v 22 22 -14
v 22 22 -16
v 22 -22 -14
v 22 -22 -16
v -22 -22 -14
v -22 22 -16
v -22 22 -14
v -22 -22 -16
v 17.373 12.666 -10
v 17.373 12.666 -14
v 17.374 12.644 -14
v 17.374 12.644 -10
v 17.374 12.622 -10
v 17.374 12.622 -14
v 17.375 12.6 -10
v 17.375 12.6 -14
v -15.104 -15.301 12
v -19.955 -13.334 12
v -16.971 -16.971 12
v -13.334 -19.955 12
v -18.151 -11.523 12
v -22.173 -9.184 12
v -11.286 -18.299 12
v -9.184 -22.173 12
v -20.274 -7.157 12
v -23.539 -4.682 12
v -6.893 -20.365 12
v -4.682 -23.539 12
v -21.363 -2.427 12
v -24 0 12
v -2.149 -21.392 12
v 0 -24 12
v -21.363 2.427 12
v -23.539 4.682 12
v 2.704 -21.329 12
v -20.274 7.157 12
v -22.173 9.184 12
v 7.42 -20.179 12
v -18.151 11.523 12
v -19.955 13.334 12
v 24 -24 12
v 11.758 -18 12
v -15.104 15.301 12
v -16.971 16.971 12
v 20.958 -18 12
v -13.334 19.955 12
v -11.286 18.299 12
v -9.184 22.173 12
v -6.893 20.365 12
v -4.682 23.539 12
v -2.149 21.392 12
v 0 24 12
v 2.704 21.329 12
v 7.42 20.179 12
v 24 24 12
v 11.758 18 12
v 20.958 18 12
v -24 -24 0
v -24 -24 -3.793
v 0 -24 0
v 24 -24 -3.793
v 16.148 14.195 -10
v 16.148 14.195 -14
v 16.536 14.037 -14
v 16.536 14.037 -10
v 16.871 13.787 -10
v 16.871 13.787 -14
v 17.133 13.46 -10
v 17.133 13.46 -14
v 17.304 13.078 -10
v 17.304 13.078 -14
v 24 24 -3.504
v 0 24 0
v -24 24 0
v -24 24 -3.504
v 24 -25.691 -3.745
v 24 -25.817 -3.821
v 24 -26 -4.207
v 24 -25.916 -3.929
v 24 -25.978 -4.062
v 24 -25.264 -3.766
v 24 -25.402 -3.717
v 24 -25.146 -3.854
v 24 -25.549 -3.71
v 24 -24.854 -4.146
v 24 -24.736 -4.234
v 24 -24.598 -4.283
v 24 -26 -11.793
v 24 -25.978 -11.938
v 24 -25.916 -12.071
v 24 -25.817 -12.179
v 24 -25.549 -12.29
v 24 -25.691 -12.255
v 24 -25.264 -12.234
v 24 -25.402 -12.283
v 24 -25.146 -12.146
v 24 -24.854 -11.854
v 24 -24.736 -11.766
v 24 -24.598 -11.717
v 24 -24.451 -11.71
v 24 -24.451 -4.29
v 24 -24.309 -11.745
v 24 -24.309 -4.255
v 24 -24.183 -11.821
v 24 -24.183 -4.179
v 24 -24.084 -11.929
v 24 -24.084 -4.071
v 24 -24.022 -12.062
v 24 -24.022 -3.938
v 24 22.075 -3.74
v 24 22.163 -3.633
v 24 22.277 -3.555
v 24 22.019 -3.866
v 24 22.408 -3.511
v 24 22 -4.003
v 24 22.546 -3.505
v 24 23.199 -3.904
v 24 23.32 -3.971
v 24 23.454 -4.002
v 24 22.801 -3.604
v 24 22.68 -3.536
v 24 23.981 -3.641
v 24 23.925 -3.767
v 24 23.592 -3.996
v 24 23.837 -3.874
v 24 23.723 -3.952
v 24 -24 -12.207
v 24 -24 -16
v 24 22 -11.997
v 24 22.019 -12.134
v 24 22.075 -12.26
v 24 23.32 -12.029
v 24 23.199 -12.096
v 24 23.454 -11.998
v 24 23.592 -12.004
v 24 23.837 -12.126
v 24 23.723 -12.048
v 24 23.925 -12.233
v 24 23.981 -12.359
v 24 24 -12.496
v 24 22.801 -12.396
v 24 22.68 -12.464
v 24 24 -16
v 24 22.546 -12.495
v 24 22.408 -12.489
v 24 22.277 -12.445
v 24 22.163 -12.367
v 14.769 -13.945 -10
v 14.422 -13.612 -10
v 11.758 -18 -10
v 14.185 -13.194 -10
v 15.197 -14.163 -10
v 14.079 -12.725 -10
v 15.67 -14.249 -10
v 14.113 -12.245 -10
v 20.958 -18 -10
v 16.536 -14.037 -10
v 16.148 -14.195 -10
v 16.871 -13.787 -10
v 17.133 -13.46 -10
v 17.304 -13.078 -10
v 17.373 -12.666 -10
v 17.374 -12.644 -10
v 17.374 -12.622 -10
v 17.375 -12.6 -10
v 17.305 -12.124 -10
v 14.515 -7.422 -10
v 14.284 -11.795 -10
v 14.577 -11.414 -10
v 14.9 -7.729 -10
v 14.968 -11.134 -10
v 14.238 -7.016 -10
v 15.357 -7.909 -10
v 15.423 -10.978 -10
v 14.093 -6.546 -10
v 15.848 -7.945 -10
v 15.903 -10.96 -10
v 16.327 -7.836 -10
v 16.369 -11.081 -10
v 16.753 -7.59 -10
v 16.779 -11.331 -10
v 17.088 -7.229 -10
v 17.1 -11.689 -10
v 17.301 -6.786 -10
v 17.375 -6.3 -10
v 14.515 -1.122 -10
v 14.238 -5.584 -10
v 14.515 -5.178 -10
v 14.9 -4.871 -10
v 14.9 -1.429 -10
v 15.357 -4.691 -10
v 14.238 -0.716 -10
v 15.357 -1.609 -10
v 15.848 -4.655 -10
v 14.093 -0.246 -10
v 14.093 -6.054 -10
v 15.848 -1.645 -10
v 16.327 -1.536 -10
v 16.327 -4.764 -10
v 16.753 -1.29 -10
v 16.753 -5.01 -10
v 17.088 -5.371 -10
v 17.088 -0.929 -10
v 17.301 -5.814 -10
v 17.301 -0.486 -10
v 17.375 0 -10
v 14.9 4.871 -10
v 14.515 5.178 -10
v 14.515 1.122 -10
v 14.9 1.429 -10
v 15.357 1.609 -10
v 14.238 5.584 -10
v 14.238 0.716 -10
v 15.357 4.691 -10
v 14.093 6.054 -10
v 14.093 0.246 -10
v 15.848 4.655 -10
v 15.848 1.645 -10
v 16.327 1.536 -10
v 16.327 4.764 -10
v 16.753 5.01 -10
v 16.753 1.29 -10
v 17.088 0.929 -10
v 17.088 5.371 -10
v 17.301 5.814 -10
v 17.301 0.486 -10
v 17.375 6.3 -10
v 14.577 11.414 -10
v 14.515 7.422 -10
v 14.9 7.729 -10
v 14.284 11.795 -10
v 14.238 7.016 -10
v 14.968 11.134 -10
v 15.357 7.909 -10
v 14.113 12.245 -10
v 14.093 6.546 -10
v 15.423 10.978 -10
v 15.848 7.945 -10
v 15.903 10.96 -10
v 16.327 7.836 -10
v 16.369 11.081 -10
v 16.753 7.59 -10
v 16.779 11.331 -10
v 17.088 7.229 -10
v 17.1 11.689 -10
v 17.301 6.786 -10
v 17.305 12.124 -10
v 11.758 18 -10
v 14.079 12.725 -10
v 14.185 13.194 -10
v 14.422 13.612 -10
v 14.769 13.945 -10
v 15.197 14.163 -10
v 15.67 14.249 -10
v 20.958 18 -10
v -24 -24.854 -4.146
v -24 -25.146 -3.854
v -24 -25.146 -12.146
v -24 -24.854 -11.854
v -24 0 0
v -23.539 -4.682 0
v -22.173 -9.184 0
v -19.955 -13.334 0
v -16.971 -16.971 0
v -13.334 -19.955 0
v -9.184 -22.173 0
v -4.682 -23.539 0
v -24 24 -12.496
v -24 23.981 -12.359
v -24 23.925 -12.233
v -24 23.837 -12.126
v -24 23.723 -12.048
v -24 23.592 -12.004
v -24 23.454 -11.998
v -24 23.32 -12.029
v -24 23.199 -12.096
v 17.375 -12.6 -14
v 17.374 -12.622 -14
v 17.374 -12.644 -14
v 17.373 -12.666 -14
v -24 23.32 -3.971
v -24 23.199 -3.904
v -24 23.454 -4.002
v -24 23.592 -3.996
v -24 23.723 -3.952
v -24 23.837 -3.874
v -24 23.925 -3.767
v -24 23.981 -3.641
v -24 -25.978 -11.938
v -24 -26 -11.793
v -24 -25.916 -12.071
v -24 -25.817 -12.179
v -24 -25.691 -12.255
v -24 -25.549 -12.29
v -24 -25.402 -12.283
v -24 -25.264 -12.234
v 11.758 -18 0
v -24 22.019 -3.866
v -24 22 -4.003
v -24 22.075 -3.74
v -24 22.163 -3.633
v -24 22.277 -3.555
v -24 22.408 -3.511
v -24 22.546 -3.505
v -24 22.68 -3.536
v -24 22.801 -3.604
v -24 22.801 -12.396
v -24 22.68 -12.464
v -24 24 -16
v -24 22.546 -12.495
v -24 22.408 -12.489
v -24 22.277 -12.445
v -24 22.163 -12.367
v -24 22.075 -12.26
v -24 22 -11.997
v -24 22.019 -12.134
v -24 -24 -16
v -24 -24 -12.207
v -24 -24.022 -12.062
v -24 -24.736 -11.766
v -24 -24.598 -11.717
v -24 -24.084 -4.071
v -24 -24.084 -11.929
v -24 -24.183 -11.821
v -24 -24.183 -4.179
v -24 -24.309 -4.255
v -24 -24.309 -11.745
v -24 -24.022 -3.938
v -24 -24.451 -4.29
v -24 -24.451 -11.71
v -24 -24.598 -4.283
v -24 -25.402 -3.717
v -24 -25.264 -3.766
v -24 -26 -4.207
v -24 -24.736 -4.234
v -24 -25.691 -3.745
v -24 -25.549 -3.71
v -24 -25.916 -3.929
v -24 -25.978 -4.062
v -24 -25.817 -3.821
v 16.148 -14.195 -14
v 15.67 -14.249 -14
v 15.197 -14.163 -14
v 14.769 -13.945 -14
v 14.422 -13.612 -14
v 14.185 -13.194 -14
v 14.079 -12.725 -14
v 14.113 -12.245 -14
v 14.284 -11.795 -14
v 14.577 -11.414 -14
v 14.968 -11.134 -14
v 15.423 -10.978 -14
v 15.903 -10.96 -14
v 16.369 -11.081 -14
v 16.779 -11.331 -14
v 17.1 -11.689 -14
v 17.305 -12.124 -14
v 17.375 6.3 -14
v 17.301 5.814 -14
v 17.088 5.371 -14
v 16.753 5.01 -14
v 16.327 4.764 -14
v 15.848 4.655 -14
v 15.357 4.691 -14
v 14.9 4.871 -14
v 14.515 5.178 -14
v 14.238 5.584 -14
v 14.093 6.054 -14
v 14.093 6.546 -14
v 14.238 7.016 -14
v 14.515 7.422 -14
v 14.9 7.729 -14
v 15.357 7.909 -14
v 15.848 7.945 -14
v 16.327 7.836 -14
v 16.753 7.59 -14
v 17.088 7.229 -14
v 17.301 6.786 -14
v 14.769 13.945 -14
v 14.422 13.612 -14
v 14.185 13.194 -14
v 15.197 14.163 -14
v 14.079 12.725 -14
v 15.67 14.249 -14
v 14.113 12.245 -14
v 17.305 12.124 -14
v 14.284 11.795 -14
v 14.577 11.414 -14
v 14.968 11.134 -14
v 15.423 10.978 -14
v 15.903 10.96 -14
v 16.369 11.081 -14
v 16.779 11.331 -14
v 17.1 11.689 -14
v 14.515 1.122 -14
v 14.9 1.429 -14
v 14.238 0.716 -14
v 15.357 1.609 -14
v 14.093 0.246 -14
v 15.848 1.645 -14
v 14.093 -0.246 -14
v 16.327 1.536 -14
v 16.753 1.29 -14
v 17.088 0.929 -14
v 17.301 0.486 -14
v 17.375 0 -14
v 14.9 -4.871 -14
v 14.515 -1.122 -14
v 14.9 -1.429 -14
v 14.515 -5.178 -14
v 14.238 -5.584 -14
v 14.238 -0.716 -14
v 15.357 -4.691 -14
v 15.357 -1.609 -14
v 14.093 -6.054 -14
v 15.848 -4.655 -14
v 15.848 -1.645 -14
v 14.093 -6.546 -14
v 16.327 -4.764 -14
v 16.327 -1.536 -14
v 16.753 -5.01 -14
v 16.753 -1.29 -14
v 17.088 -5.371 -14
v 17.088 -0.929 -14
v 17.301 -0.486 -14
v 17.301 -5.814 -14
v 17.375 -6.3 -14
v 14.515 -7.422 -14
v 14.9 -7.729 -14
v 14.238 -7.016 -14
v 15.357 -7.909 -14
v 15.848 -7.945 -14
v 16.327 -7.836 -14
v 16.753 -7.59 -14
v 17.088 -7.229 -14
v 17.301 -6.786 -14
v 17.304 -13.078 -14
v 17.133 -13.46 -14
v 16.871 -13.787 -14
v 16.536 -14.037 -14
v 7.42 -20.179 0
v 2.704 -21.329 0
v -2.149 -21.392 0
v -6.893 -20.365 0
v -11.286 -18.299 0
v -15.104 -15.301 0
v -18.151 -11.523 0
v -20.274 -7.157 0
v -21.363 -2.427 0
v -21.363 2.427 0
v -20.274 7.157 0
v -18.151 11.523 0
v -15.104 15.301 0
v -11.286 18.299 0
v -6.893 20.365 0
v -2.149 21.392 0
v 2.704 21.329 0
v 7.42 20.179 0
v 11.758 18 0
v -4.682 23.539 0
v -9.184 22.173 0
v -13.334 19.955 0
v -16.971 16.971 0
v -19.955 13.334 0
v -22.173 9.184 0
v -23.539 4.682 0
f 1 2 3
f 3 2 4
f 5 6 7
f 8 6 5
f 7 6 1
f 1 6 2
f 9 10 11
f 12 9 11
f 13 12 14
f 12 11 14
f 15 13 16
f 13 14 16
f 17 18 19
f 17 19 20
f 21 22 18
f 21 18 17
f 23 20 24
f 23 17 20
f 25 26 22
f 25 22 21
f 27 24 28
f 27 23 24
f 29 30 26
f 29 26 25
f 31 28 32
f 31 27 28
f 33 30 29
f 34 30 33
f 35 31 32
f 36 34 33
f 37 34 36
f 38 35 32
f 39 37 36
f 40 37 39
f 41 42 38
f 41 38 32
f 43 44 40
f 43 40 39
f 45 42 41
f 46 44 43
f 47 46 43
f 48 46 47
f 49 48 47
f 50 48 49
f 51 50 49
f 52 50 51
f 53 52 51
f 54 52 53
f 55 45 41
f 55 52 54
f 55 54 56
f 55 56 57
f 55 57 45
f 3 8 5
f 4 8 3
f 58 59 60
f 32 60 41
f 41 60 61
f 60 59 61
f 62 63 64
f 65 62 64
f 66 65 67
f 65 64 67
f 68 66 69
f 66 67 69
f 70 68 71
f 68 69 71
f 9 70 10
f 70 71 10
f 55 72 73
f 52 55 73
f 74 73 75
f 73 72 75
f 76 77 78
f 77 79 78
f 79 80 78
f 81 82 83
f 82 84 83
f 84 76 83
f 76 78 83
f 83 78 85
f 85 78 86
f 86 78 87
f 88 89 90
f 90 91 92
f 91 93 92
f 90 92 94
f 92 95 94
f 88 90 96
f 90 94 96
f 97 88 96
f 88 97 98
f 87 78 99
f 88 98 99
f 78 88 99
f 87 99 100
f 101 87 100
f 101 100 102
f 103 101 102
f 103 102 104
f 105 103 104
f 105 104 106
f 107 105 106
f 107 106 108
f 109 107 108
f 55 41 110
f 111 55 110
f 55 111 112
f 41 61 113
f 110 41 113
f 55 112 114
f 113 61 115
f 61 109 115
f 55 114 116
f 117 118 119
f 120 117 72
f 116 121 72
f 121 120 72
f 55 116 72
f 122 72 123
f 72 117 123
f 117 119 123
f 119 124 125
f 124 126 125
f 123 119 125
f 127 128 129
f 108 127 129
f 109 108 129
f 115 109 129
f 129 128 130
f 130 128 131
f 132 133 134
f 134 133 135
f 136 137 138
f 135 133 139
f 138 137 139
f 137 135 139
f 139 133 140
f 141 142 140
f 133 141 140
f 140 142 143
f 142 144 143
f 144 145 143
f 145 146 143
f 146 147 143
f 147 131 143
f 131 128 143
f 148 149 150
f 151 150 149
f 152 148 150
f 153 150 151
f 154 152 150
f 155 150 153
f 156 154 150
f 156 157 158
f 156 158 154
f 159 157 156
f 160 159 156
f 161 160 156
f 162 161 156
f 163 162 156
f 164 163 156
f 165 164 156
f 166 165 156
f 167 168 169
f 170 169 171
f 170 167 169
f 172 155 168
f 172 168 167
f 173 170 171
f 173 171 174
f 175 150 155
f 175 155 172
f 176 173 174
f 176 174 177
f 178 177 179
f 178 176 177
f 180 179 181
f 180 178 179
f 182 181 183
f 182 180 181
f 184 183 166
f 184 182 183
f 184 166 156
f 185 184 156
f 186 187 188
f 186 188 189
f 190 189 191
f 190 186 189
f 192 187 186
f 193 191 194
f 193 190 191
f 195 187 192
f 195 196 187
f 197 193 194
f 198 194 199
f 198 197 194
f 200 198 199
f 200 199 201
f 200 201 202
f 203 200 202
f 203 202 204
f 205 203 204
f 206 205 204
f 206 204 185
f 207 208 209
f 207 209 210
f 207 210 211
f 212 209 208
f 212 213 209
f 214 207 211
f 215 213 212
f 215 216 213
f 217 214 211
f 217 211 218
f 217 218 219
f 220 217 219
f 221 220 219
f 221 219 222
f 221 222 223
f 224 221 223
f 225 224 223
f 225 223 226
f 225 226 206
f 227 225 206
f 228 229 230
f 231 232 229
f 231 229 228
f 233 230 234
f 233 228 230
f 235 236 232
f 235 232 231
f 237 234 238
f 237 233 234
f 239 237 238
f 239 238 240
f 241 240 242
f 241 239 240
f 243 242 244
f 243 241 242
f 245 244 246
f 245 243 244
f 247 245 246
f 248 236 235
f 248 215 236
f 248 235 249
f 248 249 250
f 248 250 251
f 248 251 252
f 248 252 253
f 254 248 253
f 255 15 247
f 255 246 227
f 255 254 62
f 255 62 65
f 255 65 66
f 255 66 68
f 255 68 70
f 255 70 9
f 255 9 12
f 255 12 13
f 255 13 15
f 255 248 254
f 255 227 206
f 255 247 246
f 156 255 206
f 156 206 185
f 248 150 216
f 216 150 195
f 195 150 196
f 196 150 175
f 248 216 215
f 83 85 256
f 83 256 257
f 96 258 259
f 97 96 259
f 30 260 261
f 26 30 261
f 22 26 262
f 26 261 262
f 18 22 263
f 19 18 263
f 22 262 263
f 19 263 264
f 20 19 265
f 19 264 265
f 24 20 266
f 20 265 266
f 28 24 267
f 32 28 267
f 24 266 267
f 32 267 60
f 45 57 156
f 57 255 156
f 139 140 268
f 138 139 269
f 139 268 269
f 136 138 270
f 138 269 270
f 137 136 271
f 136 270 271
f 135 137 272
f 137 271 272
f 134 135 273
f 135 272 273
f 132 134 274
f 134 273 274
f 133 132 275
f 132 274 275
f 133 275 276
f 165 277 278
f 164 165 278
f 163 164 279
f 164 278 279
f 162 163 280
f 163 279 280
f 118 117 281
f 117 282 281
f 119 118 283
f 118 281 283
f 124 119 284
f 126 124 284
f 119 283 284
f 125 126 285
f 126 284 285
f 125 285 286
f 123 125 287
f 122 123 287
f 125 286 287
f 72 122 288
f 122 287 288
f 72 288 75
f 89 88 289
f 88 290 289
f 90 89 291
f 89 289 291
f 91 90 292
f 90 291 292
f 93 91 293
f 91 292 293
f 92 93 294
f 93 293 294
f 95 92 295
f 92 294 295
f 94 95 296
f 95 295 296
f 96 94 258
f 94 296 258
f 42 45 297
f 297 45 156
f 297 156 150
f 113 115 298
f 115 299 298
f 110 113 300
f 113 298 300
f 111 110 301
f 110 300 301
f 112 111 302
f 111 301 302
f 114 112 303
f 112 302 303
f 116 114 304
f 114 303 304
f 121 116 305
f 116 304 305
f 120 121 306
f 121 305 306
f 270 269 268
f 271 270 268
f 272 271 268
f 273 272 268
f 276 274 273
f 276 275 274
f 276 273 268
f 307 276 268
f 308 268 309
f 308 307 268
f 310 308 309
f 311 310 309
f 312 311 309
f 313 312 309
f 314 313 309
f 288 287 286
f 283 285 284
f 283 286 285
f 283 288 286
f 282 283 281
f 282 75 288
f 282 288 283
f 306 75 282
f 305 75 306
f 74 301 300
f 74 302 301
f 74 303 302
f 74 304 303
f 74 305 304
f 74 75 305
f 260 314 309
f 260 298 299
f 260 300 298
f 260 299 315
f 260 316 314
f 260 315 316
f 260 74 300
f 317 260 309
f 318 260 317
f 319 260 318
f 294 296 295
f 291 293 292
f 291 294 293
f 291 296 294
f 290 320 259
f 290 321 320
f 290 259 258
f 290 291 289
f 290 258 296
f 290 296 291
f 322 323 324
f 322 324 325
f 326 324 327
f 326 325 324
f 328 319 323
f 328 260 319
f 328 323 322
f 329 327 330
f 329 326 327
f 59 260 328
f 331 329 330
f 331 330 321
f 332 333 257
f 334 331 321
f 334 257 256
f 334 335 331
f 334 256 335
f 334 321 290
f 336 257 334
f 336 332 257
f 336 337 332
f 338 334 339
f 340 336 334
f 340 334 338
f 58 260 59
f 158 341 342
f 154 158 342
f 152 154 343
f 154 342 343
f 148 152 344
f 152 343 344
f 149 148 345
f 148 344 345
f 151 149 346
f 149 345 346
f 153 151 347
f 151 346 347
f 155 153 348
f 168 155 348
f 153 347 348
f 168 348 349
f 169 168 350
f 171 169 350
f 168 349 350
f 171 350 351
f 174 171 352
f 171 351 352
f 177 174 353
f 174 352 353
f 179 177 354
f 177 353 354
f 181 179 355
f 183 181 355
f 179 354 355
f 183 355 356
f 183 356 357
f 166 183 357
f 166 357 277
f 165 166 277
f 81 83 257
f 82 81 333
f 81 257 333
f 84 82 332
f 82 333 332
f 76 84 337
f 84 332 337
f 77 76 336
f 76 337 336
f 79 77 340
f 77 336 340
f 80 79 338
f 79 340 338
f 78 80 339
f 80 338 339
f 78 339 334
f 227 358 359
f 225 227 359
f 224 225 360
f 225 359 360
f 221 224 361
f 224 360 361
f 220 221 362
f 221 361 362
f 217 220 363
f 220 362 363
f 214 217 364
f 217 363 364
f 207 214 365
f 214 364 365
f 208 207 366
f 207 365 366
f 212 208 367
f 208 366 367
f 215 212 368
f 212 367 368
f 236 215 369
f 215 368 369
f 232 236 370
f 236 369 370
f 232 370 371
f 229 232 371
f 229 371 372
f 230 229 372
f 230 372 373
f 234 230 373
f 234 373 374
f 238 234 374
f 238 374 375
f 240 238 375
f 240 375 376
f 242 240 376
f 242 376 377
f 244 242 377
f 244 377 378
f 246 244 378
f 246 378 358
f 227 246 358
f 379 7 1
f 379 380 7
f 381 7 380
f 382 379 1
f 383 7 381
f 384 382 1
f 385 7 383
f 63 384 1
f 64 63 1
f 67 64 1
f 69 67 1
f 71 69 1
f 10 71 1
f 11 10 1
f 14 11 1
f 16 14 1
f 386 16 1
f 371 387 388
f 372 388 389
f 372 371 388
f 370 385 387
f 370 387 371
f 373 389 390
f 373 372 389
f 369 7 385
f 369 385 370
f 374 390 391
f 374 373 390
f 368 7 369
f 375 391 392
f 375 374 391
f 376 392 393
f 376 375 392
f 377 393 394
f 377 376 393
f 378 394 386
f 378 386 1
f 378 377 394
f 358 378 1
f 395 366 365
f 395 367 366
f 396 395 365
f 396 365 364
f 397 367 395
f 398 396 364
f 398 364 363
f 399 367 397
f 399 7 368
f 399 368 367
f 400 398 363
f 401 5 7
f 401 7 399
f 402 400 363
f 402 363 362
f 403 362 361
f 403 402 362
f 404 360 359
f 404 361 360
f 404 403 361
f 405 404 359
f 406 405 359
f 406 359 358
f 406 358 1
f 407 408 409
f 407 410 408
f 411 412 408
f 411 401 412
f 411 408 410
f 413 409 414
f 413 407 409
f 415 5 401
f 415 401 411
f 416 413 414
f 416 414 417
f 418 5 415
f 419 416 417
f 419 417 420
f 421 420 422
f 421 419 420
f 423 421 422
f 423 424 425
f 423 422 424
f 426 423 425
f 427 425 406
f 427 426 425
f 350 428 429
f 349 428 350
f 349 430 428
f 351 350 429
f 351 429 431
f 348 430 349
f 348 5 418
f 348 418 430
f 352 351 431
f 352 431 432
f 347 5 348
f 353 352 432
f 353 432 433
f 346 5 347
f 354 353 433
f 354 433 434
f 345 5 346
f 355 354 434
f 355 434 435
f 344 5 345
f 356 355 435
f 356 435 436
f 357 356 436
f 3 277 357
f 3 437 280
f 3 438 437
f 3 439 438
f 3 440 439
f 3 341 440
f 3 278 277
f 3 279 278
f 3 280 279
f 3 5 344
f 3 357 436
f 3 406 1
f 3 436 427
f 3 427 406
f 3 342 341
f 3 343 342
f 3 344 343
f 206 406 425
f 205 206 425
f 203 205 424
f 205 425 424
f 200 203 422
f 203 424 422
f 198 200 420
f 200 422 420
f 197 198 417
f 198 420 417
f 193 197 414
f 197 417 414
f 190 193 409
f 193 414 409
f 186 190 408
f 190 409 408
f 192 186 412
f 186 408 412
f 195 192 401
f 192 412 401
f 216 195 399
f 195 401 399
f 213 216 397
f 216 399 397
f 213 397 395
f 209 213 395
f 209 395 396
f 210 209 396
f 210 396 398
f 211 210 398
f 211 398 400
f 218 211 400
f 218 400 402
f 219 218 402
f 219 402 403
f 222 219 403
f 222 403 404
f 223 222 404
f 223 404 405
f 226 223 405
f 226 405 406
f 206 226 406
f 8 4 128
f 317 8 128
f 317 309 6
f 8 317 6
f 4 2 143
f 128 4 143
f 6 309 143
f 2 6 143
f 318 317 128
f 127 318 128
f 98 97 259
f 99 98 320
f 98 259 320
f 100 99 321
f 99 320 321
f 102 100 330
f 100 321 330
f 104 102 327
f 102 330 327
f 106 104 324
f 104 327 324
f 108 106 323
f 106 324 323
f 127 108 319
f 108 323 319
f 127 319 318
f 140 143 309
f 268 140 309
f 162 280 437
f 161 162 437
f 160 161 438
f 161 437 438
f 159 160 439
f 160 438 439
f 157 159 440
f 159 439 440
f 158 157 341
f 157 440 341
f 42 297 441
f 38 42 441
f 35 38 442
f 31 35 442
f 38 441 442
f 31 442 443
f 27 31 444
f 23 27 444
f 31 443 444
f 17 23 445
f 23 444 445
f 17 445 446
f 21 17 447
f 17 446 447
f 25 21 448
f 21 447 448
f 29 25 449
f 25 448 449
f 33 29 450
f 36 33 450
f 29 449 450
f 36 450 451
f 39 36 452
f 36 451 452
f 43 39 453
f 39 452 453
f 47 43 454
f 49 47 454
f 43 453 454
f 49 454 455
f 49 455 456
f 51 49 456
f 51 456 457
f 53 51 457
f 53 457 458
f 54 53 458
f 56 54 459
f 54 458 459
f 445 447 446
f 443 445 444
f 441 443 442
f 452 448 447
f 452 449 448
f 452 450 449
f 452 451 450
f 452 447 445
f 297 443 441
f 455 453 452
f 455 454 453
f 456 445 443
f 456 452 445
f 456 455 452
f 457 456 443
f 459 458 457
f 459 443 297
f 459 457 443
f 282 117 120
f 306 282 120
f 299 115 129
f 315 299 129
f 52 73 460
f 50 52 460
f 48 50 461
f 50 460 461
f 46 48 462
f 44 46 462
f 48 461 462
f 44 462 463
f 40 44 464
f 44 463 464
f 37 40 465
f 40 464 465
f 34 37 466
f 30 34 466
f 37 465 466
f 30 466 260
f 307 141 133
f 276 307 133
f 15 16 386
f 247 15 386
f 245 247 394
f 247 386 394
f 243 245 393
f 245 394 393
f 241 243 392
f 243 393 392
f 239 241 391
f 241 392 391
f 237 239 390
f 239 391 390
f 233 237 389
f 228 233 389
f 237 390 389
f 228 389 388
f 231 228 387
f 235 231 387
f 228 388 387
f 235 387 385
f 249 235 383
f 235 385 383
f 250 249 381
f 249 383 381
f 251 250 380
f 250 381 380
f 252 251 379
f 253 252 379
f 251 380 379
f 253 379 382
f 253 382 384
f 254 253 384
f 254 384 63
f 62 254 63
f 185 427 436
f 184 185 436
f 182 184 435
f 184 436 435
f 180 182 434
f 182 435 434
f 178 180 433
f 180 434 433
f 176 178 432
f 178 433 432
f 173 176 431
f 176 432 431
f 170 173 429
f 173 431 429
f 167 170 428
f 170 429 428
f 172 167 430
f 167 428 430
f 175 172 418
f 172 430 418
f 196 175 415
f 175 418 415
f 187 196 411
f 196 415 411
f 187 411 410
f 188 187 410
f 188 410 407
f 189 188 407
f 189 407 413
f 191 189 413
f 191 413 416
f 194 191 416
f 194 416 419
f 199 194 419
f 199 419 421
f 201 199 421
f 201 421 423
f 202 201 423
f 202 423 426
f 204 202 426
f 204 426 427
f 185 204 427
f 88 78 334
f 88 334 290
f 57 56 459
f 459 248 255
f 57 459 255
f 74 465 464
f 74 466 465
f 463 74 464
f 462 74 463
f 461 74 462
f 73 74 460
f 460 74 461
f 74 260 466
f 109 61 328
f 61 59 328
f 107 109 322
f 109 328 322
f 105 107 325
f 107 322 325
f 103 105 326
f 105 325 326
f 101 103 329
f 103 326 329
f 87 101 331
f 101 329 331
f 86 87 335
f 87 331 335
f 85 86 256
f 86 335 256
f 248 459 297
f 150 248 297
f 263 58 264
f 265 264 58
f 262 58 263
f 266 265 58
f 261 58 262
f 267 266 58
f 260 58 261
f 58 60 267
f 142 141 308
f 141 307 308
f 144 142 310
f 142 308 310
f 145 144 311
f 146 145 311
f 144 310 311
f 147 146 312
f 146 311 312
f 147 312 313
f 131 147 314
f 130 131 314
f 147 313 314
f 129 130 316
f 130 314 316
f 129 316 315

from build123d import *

# Parameters (mm, degrees)
F1_DEPTH  = 16
F2_DEPTH  = 12
F3_W      = 44
F3_H      = 44
F4_DEPTH  = 2
F5_R      = 1.65
F6_DEPTH  = 25
F8_DEPTH  = 48
F9_DEPTH  = 48
F10_R     = 0.5
F11_W     = 1.8
F11_H     = 2.1
F14_DEPTH = 10


# Not quite as in the source:
# - a feature names something its author has since deleted; it is built from what else it names


with BuildPart() as f1:
    # F0 (on Top) → F1 (new body)
    with BuildSketch(Plane.XY):
        with BuildLine():
            ThreePointArc((0, 24), (8.4852813742, 22.4499443206), (15.8745078664, 18))
            Line((15.8745078664, 18), (20.9579760163, 18))
            Line((20.9579760163, 18), (20.9579760163, 11.6945817069))
            ThreePointArc((20.9579760163, 11.6945817069), (23.2270469969, 6.0418778376), (24, 0))
            Line((24, 0), (24, 24))
            Line((24, 24), (0, 24))
        make_face()
        with BuildLine():
            Line((20.9579760163, -18), (15.8745078664, -18))
            ThreePointArc((15.8745078664, -18), (8.4852813742, -22.4499443206), (0, -24))
            Line((0, -24), (24, -24))
            Line((24, -24), (24, 0))
            ThreePointArc((24, 0), (23.2270469969, -6.0418778376), (20.9579760163, -11.6945817069))
            Line((20.9579760163, -11.6945817069), (20.9579760163, -18))
        make_face()
        with BuildLine():
            Line((15.8745078664, 18), (11.7579760163, 18))
            ThreePointArc((11.7579760163, 18), (17.6397784352, 12.2917946922), (20.9579760163, 4.7972118256))
            Line((20.9579760163, 4.7972118256), (20.9579760163, 11.6945817069))
            ThreePointArc((20.9579760163, 11.6945817069), (18.6841521671, 15.0632817737), (15.8745078664, 18))
        make_face()
        with BuildLine():
            ThreePointArc((11.7579760163, -18), (-21.5, 0), (11.7579760163, 18))
            Line((11.7579760163, 18), (15.8745078664, 18))
            ThreePointArc((15.8745078664, 18), (8.4852813742, 22.4499443206), (0, 24))
            ThreePointArc((0, 24), (-16.9705627485, 16.9705627485), (-24, 0))
            ThreePointArc((-24, 0), (-16.9705627485, -16.9705627485), (0, -24))
            ThreePointArc((0, -24), (8.4852813742, -22.4499443206), (15.8745078664, -18))
            Line((15.8745078664, -18), (11.7579760163, -18))
        make_face()
        with BuildLine():
            ThreePointArc((20.9579760163, -4.7972118256), (17.6397784352, -12.2917946922), (11.7579760163, -18))
            Line((11.7579760163, -18), (15.8745078664, -18))
            ThreePointArc((15.8745078664, -18), (18.6841521671, -15.0632817737), (20.9579760163, -11.6945817069))
            Line((20.9579760163, -11.6945817069), (20.9579760163, -4.7972118256))
        make_face()
        with BuildLine():
            Line((20.9579760163, 11.6945817069), (20.9579760163, 4.7972118256))
            ThreePointArc((20.9579760163, 4.7972118256), (21.364064271, 2.4138678143), (21.5, 0))
            ThreePointArc((21.5, 0), (21.364064271, -2.4138678143), (20.9579760163, -4.7972118256))
            Line((20.9579760163, -4.7972118256), (20.9579760163, -11.6945817069))
            ThreePointArc((20.9579760163, -11.6945817069), (23.2270469969, -6.0418778376), (24, 0))
            ThreePointArc((24, 0), (23.2270469969, 6.0418778376), (20.9579760163, 11.6945817069))
        make_face()
        with BuildLine():
            ThreePointArc((-24, 0), (-16.9705627485, 16.9705627485), (0, 24))
            Line((0, 24), (-24, 24))
            Line((-24, 24), (-24, 0))
        make_face()
        with BuildLine():
            Line((11.7579760163, -18), (11.7579760163, 18))
            ThreePointArc((11.7579760163, 18), (-21.5, 0), (11.7579760163, -18))
        make_face()
        with BuildLine():
            Line((-24, -24), (0, -24))
            ThreePointArc((0, -24), (-16.9705627485, -16.9705627485), (-24, 0))
            Line((-24, 0), (-24, -24))
        make_face()
        with BuildLine():
            Line((20.9579760163, 18), (15.8745078664, 18))
            ThreePointArc((15.8745078664, 18), (18.6841521671, 15.0632817737), (20.9579760163, 11.6945817069))
            Line((20.9579760163, 11.6945817069), (20.9579760163, 18))
        make_face()
        with BuildLine():
            ThreePointArc((20.9579760163, -11.6945817069), (18.6841521671, -15.0632817737), (15.8745078664, -18))
            Line((15.8745078664, -18), (20.9579760163, -18))
            Line((20.9579760163, -18), (20.9579760163, -11.6945817069))
        make_face()
        with BuildLine():
            ThreePointArc((21.5, 0), (21.364064271, 2.4138678143), (20.9579760163, 4.7972118256))
            Line((20.9579760163, 4.7972118256), (20.9579760163, -4.7972118256))
            ThreePointArc((20.9579760163, -4.7972118256), (21.364064271, -2.4138678143), (21.5, 0))
        make_face()
        with BuildLine():
            ThreePointArc((20.9579760163, 4.7972118256), (17.6397784352, 12.2917946922), (11.7579760163, 18))
            Line((11.7579760163, 18), (11.7579760163, -18))
            ThreePointArc((11.7579760163, -18), (17.6397784352, -12.2917946922), (20.9579760163, -4.7972118256))
            Line((20.9579760163, -4.7972118256), (20.9579760163, 4.7972118256))
        make_face()
    extrude(amount=-F1_DEPTH)

    # F0 (on Top) → F2 (join)
    with BuildSketch(Plane.XY):
        with BuildLine():
            ThreePointArc((11.7579760163, -18), (-21.5, 0), (11.7579760163, 18))
            Line((11.7579760163, 18), (15.8745078664, 18))
            ThreePointArc((15.8745078664, 18), (8.4852813742, 22.4499443206), (0, 24))
            ThreePointArc((0, 24), (-16.9705627485, 16.9705627485), (-24, 0))
            ThreePointArc((-24, 0), (-16.9705627485, -16.9705627485), (0, -24))
            ThreePointArc((0, -24), (8.4852813742, -22.4499443206), (15.8745078664, -18))
            Line((15.8745078664, -18), (11.7579760163, -18))
        make_face()
        with BuildLine():
            Line((20.9579760163, -18), (15.8745078664, -18))
            ThreePointArc((15.8745078664, -18), (8.4852813742, -22.4499443206), (0, -24))
            Line((0, -24), (24, -24))
            Line((24, -24), (24, 0))
            ThreePointArc((24, 0), (23.2270469969, -6.0418778376), (20.9579760163, -11.6945817069))
            Line((20.9579760163, -11.6945817069), (20.9579760163, -18))
        make_face()
        with BuildLine():
            Line((20.9579760163, 11.6945817069), (20.9579760163, 4.7972118256))
            ThreePointArc((20.9579760163, 4.7972118256), (21.364064271, 2.4138678143), (21.5, 0))
            ThreePointArc((21.5, 0), (21.364064271, -2.4138678143), (20.9579760163, -4.7972118256))
            Line((20.9579760163, -4.7972118256), (20.9579760163, -11.6945817069))
            ThreePointArc((20.9579760163, -11.6945817069), (23.2270469969, -6.0418778376), (24, 0))
            ThreePointArc((24, 0), (23.2270469969, 6.0418778376), (20.9579760163, 11.6945817069))
        make_face()
        with BuildLine():
            ThreePointArc((0, 24), (8.4852813742, 22.4499443206), (15.8745078664, 18))
            Line((15.8745078664, 18), (20.9579760163, 18))
            Line((20.9579760163, 18), (20.9579760163, 11.6945817069))
            ThreePointArc((20.9579760163, 11.6945817069), (23.2270469969, 6.0418778376), (24, 0))
            Line((24, 0), (24, 24))
            Line((24, 24), (0, 24))
        make_face()
        with BuildLine():
            ThreePointArc((21.5, 0), (21.364064271, 2.4138678143), (20.9579760163, 4.7972118256))
            Line((20.9579760163, 4.7972118256), (20.9579760163, -4.7972118256))
            ThreePointArc((20.9579760163, -4.7972118256), (21.364064271, -2.4138678143), (21.5, 0))
        make_face()
    extrude(amount=F2_DEPTH)

    # F3 (on face) → F4 (cut)
    with BuildSketch(Plane(origin=(0, 0, -16), x_dir=(1, 0, 0), z_dir=(0, 0, -1))):
        Rectangle(F3_W, F3_H)
    extrude(amount=-F4_DEPTH, mode=Mode.SUBTRACT)

    # F5 (on face) → F6 (cut)
    with BuildSketch(Plane(origin=(0, 0, -14), x_dir=(1, 0, 0), z_dir=(0, 0, -1))):
        with BuildLine():
            ThreePointArc((17.3732751343, 12.6656745224), (16.7780906851, 13.4441687345), (16.1480507184, 14.1947334599))
            ThreePointArc((16.1480507184, 14.1947334599), (14.4166793265, 11.5940731357), (17.3745826654, 12.6))
            ThreePointArc((17.3745826654, 12.6), (17.3742557502, 12.6328437686), (17.3732751343, 12.6656745224))
        make_face()
        with BuildLine():
            ThreePointArc((17.3732751343, 12.6656745224), (17.0122035784, 13.6317617866), (16.1480507184, 14.1947334599))
            ThreePointArc((16.1480507184, 14.1947334599), (16.7780906851, 13.4441687345), (17.3732751343, 12.6656745224))
        make_face()
        with Locations((15.7245826654, 6.3)):
            Circle(F5_R)
        with Locations((15.7245826654, 0)):
            Circle(F5_R)
        with Locations((15.7245826654, -6.3)):
            Circle(F5_R)
        with BuildLine():
            ThreePointArc((17.3732751343, -12.6656745224), (16.7780906851, -13.4441687345), (16.1480507184, -14.1947334599))
            ThreePointArc((16.1480507184, -14.1947334599), (17.0122035784, -13.6317617866), (17.3732751343, -12.6656745224))
        make_face()
        with BuildLine():
            ThreePointArc((17.3745826654, -12.6), (14.4166793265, -11.5940731357), (16.1480507184, -14.1947334599))
            ThreePointArc((16.1480507184, -14.1947334599), (16.7780906851, -13.4441687345), (17.3732751343, -12.6656745224))
            ThreePointArc((17.3732751343, -12.6656745224), (17.3742557502, -12.6328437686), (17.3745826654, -12.6))
        make_face()
    extrude(amount=-F6_DEPTH, mode=Mode.SUBTRACT)

    # F7 (on face) → F8 (join, through all)
    with BuildSketch(Plane.YZ.offset(24)):
        Polygon((-26, -13), (-24, -11), (-24, -5), (-26, -3), align=None)
    extrude(amount=-F8_DEPTH)

    # F7 (on face) → F9 (cut, through all)
    with BuildSketch(Plane.YZ.offset(24)):
        Polygon((22, -13), (24, -11.4928918998), (24, -4.5071081002), (22, -3), align=None)
    extrude(amount=-F9_DEPTH, mode=Mode.SUBTRACT)

    # F10
    f10_edges = [f1.edges().sort_by_distance(p)[0] for p in [
        (0, -26, -13),
        (0, -26, -3),
        (0, 22, -3),
        (0, 22, -13),
        (0, 24, -4.507108),
        (0, 24, -11.492892),
        (0, -24, -5),
        (0, -24, -11),
    ]]
    fillet(f10_edges, radius=F10_R)

    # F11 (on Front) → F12 (revolve, cut)
    with BuildSketch(Plane.XZ):
        with Locations((12.6579760163, 5.05)):
            Rectangle(F11_W, F11_H)
    revolve(axis=Axis((0, 0, 12), (0, 0, -1)), mode=Mode.SUBTRACT)

    # F0 (on Top) + F13 (on face) → F14 (cut)
    with BuildSketch(Plane.XY):
        with BuildLine():
            ThreePointArc((20.9579760163, 4.7972118256), (17.6397784352, 12.2917946922), (11.7579760163, 18))
            Line((11.7579760163, 18), (11.7579760163, -18))
            ThreePointArc((11.7579760163, -18), (17.6397784352, -12.2917946922), (20.9579760163, -4.7972118256))
            Line((20.9579760163, -4.7972118256), (20.9579760163, 4.7972118256))
        make_face()
        with BuildLine():
            ThreePointArc((20.9579760163, -4.7972118256), (17.6397784352, -12.2917946922), (11.7579760163, -18))
            Line((11.7579760163, -18), (15.8745078664, -18))
            ThreePointArc((15.8745078664, -18), (18.6841521671, -15.0632817737), (20.9579760163, -11.6945817069))
            Line((20.9579760163, -11.6945817069), (20.9579760163, -4.7972118256))
        make_face()
        with BuildLine():
            ThreePointArc((20.9579760163, -11.6945817069), (18.6841521671, -15.0632817737), (15.8745078664, -18))
            Line((15.8745078664, -18), (20.9579760163, -18))
            Line((20.9579760163, -18), (20.9579760163, -11.6945817069))
        make_face()
    with BuildSketch(Plane.XY):
        with BuildLine():
            Line((20.9579760163, 18), (11.7579760163, 18))
            ThreePointArc((11.7579760163, 18), (17.6397784352, 12.2917946922), (20.9579760163, 4.7972118256))
            Line((20.9579760163, 4.7972118256), (20.9579760163, 18))
        make_face()
    extrude(amount=-F14_DEPTH, mode=Mode.SUBTRACT)


solid = f1.part
